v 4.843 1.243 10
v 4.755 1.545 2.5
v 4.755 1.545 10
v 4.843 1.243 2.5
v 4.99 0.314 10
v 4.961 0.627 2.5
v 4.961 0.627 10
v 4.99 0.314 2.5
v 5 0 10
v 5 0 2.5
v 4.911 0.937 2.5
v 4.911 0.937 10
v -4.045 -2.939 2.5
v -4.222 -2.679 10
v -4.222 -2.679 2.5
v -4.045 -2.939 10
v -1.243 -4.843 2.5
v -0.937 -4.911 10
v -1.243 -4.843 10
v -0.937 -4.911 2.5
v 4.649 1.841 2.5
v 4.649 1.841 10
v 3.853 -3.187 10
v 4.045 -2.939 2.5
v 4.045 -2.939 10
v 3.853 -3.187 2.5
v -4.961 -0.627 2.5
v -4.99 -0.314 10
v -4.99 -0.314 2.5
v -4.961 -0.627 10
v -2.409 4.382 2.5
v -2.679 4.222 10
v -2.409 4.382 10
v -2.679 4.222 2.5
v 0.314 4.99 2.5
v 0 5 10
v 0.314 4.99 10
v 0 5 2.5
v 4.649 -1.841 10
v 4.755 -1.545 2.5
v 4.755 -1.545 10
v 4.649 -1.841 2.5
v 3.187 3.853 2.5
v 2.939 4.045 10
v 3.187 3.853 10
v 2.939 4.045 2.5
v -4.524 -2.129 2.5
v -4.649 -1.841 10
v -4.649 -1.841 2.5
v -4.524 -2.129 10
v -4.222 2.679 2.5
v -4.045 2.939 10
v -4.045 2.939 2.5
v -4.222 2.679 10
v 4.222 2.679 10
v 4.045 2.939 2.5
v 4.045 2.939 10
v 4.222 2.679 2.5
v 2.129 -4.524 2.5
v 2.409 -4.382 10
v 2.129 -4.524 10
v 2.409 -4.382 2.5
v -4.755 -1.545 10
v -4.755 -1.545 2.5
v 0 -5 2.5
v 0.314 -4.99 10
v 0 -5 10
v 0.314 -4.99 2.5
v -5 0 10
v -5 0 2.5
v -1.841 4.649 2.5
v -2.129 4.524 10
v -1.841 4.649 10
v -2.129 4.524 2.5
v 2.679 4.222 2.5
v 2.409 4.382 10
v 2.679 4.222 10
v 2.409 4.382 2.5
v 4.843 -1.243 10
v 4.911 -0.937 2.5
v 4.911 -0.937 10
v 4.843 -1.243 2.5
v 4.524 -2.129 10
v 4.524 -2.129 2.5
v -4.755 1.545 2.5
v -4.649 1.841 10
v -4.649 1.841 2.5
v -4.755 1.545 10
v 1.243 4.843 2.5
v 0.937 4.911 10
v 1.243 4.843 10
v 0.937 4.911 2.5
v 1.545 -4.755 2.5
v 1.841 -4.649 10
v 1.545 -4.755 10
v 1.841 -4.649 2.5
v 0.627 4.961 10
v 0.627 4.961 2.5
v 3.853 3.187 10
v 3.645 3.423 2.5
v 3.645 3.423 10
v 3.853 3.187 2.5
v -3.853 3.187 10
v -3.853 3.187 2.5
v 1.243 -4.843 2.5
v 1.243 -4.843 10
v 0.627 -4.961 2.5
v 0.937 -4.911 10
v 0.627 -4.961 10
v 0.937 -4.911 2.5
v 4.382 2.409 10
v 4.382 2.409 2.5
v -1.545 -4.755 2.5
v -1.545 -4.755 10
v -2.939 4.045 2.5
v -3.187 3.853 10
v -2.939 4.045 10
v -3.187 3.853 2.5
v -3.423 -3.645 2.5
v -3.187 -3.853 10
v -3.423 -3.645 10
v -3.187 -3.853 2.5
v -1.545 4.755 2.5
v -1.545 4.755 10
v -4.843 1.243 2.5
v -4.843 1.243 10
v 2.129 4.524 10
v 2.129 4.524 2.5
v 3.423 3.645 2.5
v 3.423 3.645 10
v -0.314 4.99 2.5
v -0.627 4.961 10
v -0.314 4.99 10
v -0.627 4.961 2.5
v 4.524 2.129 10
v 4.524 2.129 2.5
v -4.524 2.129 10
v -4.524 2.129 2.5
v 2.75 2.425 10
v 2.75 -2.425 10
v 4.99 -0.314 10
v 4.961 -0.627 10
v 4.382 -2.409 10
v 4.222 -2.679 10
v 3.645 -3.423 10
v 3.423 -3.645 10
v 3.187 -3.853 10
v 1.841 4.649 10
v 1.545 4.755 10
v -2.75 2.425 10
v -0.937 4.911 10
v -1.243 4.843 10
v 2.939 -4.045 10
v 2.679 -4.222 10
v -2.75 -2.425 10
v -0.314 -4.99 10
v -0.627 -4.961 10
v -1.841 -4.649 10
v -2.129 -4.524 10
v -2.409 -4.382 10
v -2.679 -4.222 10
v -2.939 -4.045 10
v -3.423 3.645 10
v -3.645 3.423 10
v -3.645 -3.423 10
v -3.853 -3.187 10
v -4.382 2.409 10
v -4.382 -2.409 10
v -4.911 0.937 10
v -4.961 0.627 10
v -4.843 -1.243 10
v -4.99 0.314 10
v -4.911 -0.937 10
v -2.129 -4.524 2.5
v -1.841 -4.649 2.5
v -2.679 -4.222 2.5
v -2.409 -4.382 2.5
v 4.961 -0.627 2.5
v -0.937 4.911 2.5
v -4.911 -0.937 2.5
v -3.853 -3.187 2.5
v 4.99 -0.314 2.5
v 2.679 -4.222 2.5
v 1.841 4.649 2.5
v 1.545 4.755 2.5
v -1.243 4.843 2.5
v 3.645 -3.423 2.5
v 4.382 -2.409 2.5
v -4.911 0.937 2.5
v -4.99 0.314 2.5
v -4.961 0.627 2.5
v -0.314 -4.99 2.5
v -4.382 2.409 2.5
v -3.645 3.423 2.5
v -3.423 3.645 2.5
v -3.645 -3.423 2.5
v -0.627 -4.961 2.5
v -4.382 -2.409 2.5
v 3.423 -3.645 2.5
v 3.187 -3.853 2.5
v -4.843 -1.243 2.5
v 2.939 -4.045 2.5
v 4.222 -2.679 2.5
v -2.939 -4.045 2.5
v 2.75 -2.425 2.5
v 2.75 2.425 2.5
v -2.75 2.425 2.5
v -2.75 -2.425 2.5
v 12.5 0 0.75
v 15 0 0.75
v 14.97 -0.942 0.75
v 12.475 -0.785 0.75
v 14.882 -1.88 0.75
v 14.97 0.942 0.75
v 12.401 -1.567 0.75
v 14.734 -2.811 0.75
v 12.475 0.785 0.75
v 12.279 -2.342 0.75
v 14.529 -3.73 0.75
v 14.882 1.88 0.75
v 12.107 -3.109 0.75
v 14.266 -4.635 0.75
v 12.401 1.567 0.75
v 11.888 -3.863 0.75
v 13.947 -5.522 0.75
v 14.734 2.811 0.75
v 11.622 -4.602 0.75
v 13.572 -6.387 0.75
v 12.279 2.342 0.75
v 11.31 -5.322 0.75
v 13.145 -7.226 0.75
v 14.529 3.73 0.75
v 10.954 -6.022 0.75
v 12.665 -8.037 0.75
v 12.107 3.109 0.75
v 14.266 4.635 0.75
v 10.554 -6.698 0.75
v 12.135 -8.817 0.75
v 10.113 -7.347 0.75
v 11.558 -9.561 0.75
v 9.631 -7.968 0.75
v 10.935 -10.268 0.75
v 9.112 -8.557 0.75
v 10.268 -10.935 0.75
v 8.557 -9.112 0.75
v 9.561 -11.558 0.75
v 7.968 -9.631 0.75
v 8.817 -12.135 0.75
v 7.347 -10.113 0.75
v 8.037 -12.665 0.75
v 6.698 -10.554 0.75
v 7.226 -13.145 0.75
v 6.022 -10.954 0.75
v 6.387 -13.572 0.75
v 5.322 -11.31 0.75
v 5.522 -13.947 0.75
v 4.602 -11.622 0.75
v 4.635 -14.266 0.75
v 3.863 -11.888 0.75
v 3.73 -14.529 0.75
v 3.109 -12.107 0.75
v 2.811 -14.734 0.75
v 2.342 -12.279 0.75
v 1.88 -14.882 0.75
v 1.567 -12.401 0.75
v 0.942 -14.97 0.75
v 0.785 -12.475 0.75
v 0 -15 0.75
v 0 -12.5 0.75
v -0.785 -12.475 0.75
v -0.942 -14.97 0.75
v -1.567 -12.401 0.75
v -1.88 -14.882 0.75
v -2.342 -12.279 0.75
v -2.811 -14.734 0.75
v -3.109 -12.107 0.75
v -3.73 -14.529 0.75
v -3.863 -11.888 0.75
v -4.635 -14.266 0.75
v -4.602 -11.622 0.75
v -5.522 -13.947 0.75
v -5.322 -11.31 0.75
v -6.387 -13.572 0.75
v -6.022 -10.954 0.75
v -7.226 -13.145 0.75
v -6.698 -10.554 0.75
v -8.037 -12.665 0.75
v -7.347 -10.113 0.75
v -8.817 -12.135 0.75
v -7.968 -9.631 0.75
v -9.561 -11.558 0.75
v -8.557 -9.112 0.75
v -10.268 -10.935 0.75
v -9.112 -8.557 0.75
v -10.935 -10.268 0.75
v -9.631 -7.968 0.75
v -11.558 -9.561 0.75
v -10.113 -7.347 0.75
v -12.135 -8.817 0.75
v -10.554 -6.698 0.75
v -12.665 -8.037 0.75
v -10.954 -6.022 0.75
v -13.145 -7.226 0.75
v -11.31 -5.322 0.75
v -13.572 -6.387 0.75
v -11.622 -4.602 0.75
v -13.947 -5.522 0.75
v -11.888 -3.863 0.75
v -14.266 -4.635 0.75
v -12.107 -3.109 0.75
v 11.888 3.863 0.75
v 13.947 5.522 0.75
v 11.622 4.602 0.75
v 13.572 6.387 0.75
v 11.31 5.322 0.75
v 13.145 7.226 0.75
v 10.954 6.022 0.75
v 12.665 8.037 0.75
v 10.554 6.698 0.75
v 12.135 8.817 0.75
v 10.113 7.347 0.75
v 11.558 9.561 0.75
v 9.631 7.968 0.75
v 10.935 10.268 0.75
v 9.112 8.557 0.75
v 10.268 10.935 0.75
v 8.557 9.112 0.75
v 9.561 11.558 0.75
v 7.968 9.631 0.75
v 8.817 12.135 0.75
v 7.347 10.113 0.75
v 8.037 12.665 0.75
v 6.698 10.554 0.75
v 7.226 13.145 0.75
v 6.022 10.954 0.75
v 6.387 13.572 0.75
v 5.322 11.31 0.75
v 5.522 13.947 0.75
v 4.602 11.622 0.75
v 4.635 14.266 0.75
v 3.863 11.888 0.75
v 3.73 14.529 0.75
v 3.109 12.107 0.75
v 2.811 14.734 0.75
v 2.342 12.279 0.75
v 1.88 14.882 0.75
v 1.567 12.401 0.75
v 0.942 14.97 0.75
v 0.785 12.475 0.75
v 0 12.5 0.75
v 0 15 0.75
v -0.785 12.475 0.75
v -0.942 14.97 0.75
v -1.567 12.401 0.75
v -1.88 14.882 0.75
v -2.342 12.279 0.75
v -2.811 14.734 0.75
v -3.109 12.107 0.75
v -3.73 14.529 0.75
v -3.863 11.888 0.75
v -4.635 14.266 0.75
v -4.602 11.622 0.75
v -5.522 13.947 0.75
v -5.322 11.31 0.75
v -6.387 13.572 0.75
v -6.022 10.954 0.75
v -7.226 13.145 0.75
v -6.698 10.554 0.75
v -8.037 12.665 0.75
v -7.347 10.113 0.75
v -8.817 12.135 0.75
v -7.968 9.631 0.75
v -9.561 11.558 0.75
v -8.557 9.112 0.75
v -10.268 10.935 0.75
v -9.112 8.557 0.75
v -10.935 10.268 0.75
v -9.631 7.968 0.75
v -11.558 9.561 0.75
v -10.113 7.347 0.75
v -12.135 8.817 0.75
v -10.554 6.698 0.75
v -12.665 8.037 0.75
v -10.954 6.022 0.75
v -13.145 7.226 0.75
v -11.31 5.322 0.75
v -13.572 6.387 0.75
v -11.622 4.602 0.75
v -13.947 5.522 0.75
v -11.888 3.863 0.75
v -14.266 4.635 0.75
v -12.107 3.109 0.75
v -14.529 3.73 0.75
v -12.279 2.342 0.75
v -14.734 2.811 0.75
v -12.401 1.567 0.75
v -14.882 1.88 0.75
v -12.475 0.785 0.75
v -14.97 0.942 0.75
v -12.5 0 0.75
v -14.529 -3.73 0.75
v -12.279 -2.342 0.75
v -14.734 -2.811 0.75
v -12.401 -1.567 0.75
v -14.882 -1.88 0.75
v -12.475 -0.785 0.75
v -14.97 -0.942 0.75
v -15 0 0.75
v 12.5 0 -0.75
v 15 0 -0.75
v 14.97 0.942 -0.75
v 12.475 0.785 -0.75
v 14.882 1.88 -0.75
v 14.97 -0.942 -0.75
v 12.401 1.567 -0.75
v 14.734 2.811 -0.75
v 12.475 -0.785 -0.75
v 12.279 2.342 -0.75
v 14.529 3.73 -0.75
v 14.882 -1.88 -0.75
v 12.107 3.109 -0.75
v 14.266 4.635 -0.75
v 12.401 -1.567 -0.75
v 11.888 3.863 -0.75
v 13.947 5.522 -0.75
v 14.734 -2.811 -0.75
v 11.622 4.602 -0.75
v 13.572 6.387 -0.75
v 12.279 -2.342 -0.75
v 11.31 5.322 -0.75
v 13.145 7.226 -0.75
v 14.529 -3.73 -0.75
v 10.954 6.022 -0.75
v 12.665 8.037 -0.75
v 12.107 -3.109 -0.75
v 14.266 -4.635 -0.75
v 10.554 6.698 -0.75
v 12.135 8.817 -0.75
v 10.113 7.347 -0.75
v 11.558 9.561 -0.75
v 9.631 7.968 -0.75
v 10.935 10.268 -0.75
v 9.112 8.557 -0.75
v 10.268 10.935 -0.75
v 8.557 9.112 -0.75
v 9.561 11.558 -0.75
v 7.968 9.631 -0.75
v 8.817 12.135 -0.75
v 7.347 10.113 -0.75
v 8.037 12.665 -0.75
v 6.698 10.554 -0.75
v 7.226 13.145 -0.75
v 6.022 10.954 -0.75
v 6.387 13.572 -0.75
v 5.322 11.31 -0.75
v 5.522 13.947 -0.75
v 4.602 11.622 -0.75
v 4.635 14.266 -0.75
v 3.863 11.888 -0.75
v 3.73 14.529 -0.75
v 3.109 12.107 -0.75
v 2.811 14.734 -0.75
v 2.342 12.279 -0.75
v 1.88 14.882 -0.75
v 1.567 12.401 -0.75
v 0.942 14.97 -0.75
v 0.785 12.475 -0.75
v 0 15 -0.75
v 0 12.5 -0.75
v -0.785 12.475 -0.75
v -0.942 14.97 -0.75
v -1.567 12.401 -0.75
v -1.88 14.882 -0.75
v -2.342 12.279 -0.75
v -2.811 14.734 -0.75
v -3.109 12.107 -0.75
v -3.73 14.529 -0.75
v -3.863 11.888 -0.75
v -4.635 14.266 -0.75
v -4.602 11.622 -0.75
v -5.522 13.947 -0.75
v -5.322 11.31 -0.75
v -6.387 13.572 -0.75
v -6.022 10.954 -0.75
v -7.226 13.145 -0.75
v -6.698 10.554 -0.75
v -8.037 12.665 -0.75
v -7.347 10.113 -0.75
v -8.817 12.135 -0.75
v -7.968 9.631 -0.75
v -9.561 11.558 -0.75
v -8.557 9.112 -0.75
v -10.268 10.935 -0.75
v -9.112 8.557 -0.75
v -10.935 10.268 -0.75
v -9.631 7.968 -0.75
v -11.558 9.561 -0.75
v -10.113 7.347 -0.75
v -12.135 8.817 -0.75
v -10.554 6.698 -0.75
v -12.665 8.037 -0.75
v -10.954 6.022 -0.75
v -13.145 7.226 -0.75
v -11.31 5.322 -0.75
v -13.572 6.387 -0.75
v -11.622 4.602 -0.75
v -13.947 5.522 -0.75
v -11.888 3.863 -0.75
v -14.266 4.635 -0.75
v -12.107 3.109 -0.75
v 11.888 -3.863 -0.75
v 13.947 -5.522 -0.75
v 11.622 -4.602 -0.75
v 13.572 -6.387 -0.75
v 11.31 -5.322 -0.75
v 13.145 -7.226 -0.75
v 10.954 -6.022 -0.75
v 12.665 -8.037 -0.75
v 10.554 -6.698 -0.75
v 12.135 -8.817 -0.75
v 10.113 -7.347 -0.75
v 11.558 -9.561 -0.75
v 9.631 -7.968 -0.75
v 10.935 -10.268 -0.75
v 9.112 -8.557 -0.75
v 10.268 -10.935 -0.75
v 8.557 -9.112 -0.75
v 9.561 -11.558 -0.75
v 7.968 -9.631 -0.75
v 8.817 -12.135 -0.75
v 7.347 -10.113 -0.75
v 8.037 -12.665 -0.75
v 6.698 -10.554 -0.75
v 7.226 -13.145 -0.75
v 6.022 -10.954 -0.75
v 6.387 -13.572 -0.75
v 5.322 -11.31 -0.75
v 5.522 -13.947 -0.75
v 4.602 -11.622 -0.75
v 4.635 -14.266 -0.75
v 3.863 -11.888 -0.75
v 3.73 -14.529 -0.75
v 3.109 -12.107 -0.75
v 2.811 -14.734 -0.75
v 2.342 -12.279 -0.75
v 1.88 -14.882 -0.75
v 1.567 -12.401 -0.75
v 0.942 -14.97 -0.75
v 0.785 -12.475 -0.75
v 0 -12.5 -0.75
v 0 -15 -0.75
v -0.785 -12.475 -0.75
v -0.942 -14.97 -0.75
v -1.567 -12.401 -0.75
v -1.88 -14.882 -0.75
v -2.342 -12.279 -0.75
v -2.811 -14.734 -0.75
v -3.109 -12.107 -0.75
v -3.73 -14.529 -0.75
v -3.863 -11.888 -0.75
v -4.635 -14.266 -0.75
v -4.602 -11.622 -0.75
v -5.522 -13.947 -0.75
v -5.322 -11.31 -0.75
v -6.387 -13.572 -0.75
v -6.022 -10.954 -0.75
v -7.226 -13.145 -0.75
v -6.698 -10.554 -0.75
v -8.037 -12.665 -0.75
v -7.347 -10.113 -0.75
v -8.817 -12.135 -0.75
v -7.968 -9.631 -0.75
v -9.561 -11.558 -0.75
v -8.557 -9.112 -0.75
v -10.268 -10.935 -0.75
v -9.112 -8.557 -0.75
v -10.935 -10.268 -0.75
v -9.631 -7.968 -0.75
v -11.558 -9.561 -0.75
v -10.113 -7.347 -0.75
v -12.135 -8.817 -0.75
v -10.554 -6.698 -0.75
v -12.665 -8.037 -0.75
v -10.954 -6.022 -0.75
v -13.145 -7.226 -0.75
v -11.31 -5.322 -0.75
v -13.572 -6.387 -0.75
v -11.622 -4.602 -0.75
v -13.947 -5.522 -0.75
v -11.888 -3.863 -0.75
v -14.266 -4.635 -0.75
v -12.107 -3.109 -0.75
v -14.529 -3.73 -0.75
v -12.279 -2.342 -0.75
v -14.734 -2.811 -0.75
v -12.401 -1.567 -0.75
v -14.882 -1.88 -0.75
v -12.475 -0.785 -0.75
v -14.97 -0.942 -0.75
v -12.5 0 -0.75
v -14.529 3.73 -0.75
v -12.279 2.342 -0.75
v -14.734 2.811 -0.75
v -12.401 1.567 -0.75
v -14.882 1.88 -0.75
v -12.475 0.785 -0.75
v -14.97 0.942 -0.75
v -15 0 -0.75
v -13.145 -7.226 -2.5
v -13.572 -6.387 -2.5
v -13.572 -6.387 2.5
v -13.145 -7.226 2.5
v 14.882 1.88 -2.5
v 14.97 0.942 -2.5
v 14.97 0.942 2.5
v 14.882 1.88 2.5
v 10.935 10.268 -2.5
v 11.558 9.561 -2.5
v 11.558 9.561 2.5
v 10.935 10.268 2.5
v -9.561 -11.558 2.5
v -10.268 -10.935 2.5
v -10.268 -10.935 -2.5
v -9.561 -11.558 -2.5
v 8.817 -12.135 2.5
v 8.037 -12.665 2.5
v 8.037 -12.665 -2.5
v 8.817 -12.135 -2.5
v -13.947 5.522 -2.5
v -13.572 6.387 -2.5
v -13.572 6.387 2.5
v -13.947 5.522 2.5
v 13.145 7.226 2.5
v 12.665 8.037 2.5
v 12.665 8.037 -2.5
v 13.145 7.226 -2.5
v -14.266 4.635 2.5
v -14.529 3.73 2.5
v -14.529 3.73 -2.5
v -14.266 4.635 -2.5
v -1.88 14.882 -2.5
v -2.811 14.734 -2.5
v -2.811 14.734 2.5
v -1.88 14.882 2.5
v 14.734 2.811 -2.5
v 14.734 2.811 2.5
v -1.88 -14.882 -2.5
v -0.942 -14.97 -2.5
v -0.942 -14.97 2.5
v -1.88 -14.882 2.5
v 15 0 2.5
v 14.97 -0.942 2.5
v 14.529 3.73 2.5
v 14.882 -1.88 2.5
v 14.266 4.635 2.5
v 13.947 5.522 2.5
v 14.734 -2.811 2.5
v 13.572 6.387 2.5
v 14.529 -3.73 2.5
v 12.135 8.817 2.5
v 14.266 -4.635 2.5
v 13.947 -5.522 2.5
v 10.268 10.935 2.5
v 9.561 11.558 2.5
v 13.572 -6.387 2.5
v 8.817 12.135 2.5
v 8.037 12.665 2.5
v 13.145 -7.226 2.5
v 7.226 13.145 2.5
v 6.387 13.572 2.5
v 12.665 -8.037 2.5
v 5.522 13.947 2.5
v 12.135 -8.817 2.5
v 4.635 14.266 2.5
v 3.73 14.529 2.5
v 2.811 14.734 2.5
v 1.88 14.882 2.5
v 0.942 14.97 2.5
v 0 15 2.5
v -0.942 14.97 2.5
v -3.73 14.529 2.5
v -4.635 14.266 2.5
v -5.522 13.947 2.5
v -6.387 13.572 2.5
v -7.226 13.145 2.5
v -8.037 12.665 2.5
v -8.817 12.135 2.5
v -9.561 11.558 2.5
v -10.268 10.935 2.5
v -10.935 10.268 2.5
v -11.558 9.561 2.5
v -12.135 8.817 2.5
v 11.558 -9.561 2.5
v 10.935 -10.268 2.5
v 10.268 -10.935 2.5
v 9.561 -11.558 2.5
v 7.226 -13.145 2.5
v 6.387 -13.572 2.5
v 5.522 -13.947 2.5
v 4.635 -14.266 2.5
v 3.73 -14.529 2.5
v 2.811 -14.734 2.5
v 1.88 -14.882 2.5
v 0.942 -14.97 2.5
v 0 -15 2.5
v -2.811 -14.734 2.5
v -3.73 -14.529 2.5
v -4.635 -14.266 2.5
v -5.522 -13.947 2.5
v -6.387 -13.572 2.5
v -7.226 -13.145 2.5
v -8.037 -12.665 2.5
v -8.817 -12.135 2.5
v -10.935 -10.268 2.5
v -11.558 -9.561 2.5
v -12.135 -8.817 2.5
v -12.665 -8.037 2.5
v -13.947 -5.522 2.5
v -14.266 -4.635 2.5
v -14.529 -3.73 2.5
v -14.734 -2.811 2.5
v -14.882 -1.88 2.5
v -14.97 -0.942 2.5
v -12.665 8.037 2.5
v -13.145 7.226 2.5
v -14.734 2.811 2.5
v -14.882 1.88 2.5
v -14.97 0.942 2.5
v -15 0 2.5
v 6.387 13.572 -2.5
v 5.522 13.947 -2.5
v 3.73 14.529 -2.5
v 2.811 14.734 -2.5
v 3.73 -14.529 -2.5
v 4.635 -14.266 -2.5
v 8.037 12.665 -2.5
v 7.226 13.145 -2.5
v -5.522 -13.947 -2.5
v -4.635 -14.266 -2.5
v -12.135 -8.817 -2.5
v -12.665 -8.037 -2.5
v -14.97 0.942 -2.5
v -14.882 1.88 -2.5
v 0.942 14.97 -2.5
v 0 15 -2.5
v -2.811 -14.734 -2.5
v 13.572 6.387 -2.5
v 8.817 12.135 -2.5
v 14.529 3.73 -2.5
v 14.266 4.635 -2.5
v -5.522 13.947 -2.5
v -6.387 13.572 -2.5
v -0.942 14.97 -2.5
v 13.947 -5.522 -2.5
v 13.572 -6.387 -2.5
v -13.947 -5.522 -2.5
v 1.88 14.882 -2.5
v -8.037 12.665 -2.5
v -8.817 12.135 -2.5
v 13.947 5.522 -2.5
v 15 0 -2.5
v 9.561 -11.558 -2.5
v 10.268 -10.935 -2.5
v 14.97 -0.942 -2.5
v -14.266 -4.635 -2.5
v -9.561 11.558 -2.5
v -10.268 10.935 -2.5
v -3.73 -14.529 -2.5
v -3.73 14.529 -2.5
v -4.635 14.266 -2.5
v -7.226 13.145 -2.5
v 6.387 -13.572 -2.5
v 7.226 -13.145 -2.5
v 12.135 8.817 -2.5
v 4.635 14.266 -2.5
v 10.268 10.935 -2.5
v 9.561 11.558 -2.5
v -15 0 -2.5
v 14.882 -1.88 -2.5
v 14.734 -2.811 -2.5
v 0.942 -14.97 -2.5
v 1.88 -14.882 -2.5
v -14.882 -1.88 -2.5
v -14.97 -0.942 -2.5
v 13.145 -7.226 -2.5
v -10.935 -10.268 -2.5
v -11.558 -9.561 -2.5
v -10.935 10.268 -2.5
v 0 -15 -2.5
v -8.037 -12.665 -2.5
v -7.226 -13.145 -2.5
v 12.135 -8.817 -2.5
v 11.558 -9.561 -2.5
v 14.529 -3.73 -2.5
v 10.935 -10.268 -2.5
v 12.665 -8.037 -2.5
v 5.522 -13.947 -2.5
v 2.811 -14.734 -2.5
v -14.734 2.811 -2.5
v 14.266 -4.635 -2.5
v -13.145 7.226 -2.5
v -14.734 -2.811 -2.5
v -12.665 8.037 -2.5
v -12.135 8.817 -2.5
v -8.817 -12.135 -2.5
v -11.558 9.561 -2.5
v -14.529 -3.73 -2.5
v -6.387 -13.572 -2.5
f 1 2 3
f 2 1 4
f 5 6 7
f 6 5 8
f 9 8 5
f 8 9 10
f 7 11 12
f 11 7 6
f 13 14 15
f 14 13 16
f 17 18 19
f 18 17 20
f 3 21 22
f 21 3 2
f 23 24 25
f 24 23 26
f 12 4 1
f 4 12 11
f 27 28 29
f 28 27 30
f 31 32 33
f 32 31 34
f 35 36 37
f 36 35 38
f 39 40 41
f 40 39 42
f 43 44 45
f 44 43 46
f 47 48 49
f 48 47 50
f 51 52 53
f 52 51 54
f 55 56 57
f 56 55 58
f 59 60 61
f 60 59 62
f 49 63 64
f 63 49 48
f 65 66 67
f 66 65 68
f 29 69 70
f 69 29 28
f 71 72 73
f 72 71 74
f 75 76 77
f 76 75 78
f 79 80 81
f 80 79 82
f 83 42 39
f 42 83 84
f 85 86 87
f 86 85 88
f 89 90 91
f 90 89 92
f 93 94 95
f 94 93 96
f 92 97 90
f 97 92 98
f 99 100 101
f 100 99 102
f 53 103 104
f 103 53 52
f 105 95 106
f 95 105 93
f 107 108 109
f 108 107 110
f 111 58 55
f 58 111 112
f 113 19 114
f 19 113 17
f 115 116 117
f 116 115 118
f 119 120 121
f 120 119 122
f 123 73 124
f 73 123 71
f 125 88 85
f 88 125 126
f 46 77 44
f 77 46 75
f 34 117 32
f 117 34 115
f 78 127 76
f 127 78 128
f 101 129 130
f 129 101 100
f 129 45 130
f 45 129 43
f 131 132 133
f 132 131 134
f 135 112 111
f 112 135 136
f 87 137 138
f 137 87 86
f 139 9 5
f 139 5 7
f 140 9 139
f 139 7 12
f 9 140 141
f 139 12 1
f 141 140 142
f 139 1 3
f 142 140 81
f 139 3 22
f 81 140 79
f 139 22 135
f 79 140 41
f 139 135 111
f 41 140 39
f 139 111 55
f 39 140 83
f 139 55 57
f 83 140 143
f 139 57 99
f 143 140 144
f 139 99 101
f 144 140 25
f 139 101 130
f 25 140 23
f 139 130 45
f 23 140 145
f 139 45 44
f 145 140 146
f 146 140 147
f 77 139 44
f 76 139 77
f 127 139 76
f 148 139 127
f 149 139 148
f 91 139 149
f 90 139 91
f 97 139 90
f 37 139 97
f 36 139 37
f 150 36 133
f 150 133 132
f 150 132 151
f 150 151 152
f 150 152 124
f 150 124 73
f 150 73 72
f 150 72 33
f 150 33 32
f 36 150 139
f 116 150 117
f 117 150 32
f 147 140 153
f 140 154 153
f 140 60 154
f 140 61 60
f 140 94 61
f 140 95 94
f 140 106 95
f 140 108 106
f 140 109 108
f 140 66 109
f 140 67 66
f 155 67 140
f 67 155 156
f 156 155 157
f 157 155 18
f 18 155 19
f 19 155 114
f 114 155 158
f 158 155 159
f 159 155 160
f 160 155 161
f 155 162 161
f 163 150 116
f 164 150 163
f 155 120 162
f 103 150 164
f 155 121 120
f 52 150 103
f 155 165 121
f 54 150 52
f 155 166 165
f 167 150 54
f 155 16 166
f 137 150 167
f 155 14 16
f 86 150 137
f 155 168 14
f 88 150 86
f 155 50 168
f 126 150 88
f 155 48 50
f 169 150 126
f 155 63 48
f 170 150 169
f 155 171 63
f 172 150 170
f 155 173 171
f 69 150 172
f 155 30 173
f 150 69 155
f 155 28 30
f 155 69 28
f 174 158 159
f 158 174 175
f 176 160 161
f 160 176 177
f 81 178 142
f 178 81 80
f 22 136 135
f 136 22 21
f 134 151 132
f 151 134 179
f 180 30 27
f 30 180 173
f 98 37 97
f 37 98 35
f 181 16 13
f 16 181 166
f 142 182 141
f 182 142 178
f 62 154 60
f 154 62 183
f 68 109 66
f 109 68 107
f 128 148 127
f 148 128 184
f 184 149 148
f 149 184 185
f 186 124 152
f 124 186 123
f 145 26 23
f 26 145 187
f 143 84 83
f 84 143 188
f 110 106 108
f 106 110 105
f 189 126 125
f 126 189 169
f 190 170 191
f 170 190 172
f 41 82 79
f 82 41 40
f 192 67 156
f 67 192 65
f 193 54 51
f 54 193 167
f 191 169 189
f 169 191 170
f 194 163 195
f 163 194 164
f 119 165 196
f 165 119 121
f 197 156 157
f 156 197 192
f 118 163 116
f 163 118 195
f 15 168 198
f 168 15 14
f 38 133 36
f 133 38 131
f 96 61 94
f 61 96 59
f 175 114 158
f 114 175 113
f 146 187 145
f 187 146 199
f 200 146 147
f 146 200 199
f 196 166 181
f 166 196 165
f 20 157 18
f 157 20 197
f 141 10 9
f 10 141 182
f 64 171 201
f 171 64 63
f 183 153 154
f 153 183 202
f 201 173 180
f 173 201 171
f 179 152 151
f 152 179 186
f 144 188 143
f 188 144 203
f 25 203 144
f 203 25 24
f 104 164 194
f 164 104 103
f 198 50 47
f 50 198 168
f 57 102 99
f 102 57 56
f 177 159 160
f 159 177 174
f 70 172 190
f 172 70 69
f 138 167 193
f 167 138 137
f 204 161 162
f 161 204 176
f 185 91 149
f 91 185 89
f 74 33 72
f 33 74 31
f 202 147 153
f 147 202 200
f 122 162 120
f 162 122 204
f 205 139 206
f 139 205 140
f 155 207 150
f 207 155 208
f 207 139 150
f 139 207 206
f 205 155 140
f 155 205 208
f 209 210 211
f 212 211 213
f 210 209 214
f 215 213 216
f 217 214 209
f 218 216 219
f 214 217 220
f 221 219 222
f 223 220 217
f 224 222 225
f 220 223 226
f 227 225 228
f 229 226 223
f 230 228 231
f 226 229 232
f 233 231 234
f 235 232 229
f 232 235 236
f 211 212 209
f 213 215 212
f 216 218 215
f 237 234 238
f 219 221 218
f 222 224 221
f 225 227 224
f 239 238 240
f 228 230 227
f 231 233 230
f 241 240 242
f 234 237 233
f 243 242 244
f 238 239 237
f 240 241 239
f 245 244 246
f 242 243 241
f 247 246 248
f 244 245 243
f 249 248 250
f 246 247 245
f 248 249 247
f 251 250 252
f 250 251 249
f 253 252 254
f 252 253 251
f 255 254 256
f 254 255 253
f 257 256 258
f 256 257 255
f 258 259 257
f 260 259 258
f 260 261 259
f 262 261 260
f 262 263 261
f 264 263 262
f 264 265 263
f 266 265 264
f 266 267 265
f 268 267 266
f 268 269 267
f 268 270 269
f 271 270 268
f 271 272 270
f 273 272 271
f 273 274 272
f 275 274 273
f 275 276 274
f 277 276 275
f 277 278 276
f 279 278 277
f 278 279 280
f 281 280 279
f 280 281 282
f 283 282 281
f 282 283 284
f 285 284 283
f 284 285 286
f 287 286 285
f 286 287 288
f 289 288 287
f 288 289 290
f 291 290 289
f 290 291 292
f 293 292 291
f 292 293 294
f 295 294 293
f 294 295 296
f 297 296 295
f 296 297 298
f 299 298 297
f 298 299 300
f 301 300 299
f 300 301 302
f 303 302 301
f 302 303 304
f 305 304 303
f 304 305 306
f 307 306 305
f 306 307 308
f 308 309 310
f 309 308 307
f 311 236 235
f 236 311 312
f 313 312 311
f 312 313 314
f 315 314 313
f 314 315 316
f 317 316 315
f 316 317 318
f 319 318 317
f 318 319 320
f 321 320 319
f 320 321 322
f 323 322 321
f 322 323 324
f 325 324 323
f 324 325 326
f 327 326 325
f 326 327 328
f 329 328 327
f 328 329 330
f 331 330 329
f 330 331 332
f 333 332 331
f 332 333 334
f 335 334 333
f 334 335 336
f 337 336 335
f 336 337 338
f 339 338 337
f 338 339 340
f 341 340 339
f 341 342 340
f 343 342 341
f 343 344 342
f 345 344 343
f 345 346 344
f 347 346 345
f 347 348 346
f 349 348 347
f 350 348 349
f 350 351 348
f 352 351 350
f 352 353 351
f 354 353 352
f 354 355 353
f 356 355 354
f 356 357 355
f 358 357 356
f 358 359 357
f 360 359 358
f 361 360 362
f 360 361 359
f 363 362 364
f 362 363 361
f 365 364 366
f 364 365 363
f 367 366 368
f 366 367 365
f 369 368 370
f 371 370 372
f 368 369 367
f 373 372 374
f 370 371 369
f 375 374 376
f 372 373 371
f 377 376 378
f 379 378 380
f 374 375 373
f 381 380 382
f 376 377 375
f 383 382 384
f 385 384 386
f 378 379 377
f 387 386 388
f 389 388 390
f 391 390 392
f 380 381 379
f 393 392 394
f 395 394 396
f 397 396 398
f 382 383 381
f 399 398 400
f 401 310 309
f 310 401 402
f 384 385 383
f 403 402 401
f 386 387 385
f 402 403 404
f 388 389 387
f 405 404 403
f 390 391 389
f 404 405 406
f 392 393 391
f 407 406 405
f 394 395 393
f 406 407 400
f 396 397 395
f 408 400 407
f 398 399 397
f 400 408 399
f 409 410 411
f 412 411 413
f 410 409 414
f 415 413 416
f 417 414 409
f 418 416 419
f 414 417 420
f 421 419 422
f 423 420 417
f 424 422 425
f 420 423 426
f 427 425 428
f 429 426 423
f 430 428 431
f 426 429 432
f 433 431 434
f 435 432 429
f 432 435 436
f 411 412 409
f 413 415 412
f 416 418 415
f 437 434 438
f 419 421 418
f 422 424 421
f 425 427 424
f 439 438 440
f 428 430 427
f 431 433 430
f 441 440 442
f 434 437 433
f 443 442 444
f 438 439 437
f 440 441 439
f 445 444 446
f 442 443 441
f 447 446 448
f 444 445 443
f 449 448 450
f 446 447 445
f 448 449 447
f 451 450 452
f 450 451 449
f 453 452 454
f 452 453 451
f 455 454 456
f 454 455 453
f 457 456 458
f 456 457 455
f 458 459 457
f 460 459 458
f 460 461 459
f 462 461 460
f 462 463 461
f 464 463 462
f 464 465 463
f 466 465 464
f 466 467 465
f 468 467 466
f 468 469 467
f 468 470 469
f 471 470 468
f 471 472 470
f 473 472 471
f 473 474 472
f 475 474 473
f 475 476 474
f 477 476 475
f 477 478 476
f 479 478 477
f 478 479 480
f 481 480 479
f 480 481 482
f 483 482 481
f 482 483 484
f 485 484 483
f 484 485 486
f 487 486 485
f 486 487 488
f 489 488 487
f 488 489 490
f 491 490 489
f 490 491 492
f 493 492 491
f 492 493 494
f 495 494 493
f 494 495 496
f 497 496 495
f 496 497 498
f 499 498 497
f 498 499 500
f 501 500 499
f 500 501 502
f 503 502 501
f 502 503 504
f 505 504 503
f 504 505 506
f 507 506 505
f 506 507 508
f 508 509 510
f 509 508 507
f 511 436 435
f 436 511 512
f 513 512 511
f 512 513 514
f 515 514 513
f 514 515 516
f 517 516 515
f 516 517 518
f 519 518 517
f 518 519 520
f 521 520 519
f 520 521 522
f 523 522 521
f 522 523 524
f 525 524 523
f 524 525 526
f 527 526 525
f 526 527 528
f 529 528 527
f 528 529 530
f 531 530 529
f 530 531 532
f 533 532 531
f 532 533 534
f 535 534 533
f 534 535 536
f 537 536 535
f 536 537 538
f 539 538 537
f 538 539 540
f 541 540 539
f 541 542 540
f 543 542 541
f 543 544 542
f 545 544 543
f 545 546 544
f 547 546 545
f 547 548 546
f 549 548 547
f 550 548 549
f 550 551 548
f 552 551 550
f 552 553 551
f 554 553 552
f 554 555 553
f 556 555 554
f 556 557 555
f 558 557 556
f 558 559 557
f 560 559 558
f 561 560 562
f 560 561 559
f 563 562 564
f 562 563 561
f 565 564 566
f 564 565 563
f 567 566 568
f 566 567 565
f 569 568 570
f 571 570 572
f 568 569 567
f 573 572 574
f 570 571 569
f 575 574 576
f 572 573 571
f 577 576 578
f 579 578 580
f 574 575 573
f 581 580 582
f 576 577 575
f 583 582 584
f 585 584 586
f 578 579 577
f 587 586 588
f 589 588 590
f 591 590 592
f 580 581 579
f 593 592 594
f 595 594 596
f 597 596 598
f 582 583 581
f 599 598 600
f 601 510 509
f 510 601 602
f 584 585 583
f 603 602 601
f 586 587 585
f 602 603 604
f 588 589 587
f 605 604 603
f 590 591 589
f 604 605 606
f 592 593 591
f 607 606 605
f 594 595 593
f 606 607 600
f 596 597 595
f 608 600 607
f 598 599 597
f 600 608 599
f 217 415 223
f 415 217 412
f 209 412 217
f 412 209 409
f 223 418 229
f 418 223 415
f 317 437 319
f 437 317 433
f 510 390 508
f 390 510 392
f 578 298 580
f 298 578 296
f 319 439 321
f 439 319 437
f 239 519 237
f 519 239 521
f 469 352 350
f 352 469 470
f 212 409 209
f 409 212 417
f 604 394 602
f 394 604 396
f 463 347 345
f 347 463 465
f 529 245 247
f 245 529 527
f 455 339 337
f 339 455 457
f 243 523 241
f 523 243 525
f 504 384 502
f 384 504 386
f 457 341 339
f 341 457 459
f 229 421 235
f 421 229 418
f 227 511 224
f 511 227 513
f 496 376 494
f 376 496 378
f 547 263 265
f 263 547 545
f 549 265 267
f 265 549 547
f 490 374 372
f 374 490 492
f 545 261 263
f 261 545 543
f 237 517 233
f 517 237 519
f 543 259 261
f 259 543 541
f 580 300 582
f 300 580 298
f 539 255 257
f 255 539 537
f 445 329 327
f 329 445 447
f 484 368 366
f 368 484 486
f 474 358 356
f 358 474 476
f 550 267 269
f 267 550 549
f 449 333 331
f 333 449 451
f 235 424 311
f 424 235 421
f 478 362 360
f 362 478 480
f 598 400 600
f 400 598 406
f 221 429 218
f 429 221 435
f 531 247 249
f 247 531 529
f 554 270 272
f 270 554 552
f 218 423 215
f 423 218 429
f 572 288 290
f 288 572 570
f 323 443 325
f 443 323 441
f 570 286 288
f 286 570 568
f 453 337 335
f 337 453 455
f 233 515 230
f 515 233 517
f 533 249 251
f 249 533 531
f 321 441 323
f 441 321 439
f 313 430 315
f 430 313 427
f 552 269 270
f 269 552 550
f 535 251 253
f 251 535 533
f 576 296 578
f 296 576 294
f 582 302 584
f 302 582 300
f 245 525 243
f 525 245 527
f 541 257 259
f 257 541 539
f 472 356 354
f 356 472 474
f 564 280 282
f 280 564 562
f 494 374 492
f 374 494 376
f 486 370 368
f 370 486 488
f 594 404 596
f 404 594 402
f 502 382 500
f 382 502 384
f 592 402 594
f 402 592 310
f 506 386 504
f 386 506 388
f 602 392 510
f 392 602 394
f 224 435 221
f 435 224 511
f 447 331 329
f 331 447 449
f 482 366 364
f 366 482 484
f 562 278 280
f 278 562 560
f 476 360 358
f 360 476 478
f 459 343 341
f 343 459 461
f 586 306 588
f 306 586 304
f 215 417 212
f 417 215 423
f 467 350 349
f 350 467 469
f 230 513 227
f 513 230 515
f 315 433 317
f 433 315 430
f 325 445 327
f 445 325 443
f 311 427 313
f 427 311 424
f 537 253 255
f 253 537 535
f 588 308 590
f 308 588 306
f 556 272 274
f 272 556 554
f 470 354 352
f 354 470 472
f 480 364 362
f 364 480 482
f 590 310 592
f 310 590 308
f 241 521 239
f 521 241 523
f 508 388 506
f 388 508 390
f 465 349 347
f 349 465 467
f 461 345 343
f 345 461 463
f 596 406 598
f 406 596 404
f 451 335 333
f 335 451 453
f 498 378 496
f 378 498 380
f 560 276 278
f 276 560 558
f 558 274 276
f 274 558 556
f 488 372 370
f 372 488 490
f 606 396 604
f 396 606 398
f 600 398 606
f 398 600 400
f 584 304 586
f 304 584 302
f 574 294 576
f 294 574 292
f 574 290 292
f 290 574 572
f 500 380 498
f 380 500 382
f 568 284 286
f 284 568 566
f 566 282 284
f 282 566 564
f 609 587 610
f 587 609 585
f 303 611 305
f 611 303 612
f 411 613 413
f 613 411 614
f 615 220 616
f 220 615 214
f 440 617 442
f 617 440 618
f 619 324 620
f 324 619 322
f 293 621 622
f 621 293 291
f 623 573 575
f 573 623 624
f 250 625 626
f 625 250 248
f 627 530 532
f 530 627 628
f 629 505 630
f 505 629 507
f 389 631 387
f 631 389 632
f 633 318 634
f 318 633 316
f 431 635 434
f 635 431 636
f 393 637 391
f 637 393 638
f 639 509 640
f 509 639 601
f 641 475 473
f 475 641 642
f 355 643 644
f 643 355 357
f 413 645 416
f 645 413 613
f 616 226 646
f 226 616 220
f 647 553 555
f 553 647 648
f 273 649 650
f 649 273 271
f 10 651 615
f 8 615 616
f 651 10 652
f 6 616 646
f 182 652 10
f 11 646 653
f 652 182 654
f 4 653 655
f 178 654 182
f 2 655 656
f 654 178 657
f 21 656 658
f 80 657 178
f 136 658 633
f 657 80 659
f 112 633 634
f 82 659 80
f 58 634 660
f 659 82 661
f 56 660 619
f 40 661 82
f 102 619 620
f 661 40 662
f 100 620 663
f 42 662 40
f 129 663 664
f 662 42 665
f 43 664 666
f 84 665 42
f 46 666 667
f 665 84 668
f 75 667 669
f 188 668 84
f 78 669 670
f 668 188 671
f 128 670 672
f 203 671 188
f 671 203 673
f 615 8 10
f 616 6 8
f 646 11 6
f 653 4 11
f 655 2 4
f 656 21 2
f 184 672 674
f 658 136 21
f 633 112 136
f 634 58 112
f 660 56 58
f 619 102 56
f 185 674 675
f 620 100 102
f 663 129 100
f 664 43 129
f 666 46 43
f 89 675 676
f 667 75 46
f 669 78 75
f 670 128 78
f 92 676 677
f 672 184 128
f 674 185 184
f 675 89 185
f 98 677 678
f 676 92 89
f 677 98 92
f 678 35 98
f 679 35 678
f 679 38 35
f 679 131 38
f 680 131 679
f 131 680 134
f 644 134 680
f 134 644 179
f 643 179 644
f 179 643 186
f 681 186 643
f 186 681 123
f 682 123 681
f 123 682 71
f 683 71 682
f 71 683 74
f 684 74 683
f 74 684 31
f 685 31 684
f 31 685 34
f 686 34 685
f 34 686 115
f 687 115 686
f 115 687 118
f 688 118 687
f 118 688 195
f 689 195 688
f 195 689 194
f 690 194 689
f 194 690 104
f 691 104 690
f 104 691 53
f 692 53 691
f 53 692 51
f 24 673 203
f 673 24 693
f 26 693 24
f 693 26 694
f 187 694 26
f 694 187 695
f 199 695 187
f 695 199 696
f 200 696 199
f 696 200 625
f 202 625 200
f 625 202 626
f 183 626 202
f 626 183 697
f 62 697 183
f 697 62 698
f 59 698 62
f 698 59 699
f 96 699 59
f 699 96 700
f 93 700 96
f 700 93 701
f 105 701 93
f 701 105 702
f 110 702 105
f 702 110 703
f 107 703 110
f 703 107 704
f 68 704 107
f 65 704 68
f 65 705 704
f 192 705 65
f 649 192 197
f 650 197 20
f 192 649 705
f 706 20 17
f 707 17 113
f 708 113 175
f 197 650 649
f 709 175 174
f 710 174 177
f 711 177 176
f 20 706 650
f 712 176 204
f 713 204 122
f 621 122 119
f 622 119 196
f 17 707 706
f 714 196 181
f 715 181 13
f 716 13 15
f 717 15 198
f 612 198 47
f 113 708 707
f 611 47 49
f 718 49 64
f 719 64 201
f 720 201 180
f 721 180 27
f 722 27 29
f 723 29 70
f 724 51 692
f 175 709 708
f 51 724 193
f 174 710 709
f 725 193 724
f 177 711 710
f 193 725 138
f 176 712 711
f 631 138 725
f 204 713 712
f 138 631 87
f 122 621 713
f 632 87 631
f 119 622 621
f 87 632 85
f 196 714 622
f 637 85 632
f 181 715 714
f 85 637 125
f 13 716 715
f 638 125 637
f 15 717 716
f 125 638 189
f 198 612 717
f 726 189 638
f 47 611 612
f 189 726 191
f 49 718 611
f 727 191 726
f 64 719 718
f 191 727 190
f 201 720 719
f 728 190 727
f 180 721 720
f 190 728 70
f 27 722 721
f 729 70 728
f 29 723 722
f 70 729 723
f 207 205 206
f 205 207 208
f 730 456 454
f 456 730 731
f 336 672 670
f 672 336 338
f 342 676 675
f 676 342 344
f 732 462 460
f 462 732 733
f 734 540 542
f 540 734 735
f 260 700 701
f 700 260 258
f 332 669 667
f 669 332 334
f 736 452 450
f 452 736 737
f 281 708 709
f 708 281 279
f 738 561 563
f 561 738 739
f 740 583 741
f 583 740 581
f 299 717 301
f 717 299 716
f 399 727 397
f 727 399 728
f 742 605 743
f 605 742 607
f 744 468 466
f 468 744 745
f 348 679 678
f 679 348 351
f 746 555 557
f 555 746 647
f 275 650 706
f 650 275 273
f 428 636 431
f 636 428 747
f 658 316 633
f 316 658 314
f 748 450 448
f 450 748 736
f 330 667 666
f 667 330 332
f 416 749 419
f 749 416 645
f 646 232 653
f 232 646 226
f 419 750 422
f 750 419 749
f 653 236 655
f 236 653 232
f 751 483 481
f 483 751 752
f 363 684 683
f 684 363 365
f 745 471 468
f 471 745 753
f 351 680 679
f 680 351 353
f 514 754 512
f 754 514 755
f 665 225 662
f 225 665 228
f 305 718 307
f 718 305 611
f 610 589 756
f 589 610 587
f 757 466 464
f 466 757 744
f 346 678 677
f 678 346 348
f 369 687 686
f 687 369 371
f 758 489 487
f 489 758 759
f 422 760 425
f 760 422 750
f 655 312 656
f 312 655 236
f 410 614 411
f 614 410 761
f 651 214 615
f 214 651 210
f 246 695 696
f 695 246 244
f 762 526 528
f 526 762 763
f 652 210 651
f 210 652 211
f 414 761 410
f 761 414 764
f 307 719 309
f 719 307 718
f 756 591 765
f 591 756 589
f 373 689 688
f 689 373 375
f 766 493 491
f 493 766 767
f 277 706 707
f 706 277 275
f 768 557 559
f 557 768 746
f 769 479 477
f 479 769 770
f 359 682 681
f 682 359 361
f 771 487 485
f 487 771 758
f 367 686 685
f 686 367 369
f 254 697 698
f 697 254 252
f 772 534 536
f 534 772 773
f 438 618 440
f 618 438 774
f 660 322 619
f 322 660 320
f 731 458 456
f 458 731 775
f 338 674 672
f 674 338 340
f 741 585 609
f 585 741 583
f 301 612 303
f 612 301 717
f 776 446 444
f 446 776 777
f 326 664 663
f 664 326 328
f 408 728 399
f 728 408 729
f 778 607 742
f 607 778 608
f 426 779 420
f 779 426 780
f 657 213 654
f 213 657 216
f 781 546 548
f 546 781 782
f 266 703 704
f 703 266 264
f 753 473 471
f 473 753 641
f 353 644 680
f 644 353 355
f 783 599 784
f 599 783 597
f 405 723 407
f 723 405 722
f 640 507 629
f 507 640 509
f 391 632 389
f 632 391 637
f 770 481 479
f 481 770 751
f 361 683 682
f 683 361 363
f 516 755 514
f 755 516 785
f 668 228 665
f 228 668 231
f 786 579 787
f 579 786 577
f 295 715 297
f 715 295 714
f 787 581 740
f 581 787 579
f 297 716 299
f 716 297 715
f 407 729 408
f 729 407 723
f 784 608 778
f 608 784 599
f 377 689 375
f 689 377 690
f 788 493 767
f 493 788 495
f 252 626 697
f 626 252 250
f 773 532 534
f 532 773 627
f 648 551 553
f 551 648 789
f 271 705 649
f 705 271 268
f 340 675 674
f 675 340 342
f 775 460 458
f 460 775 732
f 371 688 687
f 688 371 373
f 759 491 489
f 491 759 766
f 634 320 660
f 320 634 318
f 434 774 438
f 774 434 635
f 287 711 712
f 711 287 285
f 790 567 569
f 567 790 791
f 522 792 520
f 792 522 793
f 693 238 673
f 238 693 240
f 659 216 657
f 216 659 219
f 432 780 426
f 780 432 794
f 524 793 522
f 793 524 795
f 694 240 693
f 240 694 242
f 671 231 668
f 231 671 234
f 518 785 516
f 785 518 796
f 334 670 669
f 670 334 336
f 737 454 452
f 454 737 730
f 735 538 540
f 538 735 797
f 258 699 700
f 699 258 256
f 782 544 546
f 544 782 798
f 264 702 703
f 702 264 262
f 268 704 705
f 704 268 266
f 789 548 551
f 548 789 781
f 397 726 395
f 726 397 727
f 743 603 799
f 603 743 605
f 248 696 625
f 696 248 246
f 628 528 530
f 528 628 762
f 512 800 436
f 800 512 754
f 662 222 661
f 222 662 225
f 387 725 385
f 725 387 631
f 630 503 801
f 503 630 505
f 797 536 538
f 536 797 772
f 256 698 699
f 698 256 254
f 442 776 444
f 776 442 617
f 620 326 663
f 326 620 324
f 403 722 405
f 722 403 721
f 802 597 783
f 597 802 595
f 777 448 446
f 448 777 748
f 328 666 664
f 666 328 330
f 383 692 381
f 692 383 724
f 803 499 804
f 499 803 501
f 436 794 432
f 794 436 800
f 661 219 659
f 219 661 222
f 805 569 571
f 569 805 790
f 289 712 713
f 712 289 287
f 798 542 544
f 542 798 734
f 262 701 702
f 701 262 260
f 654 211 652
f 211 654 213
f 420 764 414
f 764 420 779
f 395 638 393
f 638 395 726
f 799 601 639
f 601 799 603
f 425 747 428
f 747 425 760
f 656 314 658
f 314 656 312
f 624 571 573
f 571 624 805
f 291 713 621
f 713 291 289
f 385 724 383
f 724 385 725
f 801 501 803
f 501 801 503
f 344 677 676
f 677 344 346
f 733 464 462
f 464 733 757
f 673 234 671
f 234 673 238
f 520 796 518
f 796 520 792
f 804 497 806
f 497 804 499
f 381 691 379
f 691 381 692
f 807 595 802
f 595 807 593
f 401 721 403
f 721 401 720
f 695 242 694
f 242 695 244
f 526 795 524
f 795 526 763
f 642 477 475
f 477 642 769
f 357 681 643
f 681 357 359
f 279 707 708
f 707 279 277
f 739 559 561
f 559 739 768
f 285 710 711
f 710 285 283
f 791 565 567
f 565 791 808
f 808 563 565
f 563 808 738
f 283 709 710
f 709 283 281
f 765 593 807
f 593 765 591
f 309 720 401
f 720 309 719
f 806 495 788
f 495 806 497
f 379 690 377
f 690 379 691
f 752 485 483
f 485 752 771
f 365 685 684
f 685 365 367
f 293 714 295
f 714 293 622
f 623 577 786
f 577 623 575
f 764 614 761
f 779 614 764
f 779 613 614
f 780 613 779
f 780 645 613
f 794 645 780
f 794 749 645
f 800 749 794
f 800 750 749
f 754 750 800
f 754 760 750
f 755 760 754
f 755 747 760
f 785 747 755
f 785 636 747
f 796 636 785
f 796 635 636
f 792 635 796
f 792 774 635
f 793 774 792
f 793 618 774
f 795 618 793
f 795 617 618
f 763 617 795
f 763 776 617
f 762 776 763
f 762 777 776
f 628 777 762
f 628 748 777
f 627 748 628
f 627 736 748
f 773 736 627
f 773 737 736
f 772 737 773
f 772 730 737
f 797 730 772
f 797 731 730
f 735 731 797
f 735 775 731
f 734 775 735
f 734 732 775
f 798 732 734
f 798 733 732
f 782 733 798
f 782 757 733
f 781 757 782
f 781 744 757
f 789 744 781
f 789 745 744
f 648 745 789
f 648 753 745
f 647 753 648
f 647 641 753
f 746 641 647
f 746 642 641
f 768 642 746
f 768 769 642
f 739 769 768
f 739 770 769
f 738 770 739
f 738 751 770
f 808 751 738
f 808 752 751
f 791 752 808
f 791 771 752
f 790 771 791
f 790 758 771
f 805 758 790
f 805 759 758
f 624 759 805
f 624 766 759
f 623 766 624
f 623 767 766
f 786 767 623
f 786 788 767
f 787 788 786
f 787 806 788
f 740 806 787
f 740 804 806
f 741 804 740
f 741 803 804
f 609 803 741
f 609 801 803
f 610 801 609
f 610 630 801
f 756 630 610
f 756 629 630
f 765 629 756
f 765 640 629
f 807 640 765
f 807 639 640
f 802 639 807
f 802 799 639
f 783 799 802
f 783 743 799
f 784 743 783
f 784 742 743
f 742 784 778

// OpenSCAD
/*
 * Date: 16/08/2016
 * Vers:   1.1.0
 *
 * Description:  
 *             this file generate the dc wheel. 
 *
 * Note:   - first release
 *          
 *         
 * Originally by Matteo Saccaro, 2016.
 * Dual licenced under Creative Commons Attribution-Share Alike 3.0 and LGPL2 or later

*/ 




module wheel(){
difference(){
 cylinder(r=5,h=10,$fn=100);
 translate([0,0,5]) cube([5.5,4.85,10],center=true);
}
difference(){
  cylinder(r=15,h=5,$fn=100,center=true);
	difference(){
	  cylinder(r=25,h=1.5,$fn=100,center=true);
	  cylinder(r=12.5,h=1.5,$fn=100,center=true);
	
	}
	
}

}



wheel();
